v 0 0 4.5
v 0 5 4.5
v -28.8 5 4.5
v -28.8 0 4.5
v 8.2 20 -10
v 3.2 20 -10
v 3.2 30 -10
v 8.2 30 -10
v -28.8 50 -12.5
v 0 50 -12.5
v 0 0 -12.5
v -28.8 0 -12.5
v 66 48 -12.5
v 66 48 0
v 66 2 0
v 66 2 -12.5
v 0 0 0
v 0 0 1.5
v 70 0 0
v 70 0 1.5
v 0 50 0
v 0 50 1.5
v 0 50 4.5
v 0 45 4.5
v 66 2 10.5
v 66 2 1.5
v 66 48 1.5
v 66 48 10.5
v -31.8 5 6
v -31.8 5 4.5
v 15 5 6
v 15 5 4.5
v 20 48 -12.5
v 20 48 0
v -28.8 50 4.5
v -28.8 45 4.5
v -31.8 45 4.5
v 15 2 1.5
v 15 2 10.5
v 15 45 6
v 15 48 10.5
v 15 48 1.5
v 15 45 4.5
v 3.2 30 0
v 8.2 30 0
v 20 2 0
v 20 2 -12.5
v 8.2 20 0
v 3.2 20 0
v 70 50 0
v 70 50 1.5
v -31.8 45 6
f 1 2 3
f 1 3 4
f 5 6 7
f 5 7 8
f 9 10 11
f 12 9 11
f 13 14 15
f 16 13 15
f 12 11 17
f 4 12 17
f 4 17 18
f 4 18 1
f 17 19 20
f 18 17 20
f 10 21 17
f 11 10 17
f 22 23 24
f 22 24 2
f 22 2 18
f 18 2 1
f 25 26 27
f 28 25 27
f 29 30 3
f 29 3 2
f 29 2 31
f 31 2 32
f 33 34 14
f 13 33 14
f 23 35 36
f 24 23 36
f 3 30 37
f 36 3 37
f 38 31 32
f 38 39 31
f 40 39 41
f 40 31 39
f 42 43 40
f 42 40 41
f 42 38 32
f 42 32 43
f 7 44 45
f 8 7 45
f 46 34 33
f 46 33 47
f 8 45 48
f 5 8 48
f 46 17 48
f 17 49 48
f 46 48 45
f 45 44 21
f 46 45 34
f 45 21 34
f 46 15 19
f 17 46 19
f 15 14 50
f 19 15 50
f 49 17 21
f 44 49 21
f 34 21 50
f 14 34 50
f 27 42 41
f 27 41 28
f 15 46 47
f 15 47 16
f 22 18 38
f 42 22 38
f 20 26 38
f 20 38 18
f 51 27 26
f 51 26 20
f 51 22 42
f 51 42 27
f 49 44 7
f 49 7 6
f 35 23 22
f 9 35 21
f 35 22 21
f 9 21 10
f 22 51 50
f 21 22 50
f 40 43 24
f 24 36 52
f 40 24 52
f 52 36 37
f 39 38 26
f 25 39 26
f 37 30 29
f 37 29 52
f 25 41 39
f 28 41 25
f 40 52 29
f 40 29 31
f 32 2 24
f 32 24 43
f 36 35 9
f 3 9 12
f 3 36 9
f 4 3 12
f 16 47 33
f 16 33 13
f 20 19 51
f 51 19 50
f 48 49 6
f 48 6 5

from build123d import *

# Parameters (mm, degrees)
F0_W      = 70
F0_H      = 50
F1_DEPTH  = 1.5
F2_W      = 46
F2_H      = 46
F3_DEPTH  = 12.5
F2_W_2    = 5
F2_H_2    = 10
F4_DEPTH  = 10
F5_W      = 51
F5_H      = 46
F6_DEPTH  = 9
F7_W      = 50
F7_H      = 3
F7_H_2    = 1.5
F7_H_3    = 12.5
F8_DEPTH  = 31.8
F9_W      = 31.8
F9_H      = 40
F9_W_2    = 15
F10_DEPTH = 1.5
F12_DEPTH = 3


with BuildPart() as f1:
    # F0 (on Top) → F1 (new body)
    with BuildSketch(Plane.XY):
        with Locations((35, 25)):
            Rectangle(F0_W, F0_H)
    extrude(amount=F1_DEPTH)

    # F2 (on face) → F3 (join)
    with BuildSketch(Plane(origin=(0, 0, 0), x_dir=(1, 0, 0), z_dir=(0, 0, -1))):
        with Locations((43, -25)):
            Rectangle(F2_W, F2_H)
    extrude(amount=F3_DEPTH)

    # F2 (on face) → F4 (join)
    with BuildSketch(Plane(origin=(0, 0, 0), x_dir=(1, 0, 0), z_dir=(0, 0, -1))):
        with Locations((5.7, -25)):
            Rectangle(F2_W_2, F2_H_2)
    extrude(amount=F4_DEPTH)

    # F5 (on face) → F6 (join)
    with BuildSketch(Plane.XY.offset(1.5)):
        with Locations((40.5, 25)):
            Rectangle(F5_W, F5_H)
    extrude(amount=F6_DEPTH)

    # F7 (on face) → F8 (join)
    with BuildSketch(Plane(origin=(0, 0, 0), x_dir=(0, -1, 0), z_dir=(-1, 0, 0))):
        with Locations((-25, 3)):
            Rectangle(F7_W, F7_H)
        with Locations((-25, 0.75)):
            Rectangle(F7_W, F7_H_2)
        with Locations((-25, -6.25)):
            Rectangle(F7_W, F7_H_3)
    extrude(amount=F8_DEPTH)

    # F9 (on face) → F10 (join)
    with BuildSketch(Plane.XY.offset(4.5)):
        with Locations((-15.9, 25)):
            Rectangle(F9_W, F9_H)
        with Locations((7.5, 25)):
            Rectangle(F9_W_2, F9_H)
    extrude(amount=F10_DEPTH)

    # F11 (on face) → F12 (cut)
    with BuildSketch(Plane(origin=(-31.8, 0, 0), x_dir=(0, -1, 0), z_dir=(-1, 0, 0))):
        Polygon((-5, 4.5), (-45, 4.5), (-50, 4.5), (-50, -12.5), (0, -12.5), (0, 4.5), align=None)
    extrude(amount=-F12_DEPTH, mode=Mode.SUBTRACT)


solid = f1.part
